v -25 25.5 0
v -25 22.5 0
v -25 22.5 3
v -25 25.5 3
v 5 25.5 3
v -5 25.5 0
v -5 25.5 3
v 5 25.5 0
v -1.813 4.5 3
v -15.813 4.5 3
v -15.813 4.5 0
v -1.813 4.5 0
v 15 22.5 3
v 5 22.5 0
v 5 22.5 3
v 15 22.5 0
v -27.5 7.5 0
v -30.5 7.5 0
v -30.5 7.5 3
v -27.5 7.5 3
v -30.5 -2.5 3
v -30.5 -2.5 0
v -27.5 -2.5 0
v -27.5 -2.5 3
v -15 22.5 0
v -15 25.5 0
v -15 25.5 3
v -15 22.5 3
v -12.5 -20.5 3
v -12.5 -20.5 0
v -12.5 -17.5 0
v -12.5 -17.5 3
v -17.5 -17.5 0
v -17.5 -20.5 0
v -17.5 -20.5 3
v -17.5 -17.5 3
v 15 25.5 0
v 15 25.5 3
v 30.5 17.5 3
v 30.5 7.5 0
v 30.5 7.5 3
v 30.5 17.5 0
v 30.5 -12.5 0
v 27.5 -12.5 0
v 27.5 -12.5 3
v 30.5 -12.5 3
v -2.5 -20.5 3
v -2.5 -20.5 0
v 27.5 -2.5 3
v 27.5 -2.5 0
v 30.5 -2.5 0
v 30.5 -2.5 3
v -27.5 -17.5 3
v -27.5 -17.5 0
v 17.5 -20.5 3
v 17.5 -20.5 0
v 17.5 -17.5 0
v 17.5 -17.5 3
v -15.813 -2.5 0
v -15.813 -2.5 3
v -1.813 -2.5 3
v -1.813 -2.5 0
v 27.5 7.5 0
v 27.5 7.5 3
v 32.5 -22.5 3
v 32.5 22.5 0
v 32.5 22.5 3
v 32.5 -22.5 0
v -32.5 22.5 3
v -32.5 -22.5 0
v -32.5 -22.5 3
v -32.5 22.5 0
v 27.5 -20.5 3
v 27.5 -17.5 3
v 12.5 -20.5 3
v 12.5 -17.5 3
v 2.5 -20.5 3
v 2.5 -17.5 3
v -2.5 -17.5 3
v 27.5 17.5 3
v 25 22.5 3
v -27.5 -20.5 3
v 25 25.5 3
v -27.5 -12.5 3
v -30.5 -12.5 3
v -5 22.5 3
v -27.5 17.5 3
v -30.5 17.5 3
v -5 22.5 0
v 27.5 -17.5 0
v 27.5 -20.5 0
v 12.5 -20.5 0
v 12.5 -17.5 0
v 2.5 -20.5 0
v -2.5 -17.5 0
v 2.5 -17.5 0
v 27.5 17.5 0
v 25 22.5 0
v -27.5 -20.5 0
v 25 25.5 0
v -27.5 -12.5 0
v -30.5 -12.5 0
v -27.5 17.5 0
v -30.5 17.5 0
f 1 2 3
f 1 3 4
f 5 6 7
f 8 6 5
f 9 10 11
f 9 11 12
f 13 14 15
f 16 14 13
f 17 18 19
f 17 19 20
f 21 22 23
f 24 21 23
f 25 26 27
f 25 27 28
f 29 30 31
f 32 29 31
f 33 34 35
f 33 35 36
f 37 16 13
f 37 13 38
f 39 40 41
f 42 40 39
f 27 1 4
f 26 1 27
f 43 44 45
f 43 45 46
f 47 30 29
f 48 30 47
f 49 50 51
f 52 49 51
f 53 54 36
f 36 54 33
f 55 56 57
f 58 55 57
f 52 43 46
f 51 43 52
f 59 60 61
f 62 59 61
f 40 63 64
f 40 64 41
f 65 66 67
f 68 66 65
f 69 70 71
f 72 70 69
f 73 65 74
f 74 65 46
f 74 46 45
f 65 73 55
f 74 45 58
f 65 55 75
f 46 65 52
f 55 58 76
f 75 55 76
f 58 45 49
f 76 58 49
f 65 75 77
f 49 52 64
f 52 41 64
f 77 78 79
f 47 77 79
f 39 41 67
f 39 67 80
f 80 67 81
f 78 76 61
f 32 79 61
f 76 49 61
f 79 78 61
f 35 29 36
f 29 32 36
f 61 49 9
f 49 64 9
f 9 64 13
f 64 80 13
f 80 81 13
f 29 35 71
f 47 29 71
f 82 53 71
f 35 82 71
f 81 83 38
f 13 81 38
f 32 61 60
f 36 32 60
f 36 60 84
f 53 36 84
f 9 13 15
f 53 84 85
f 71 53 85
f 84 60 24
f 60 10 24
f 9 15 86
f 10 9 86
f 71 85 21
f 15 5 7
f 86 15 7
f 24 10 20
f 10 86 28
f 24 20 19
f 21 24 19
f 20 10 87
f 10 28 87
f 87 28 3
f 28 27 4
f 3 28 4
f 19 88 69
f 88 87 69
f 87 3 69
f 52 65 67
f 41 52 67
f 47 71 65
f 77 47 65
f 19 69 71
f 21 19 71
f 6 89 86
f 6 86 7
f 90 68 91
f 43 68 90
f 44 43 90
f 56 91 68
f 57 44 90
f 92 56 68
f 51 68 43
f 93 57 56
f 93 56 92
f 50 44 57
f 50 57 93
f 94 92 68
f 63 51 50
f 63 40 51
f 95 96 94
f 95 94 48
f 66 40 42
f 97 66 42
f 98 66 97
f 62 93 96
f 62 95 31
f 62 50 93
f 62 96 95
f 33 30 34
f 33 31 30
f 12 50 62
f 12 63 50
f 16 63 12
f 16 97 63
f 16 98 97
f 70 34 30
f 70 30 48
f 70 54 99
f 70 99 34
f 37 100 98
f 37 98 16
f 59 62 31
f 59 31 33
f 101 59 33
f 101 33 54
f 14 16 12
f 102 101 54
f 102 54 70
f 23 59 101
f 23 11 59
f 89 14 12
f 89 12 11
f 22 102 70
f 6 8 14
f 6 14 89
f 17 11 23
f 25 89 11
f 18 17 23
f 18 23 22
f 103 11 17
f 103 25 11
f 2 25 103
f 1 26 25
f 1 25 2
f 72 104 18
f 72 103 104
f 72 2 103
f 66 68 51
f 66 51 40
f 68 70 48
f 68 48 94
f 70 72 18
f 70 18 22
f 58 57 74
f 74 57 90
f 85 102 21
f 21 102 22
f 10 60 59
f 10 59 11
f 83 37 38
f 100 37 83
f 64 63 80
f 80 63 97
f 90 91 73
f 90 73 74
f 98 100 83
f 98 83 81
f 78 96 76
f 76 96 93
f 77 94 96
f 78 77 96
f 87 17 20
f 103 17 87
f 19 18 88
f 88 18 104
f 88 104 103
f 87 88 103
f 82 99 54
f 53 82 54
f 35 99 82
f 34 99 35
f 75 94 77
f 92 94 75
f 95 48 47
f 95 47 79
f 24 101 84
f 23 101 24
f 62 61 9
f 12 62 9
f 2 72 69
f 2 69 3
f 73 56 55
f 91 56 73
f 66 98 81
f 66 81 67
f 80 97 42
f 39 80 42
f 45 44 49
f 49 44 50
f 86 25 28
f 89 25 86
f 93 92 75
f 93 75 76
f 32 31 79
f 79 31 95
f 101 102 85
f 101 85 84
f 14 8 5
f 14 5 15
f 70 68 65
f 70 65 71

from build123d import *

# Parameters (mm, degrees)
SKETCH_1_W          = 10
SKETCH_1_H          = 3
SKETCH_1_W_2        = 3
SKETCH_1_H_2        = 10
EXTRUDE_1_DEPTH     = 3
SKETCH_2_W          = 14
SKETCH_2_H          = 7
CUT_EXTRUDE_1_DEPTH = 10


with BuildPart() as part:
    # 草图1 → 凸台-拉伸1 (new body)
    with BuildSketch(Plane.XY):
        Polygon((-5, 22.5), (-5, 25.5), (5, 25.5), (5, 22.5), (15, 22.5), (15, 25.5), (25, 25.5), (25, 22.5), (32.5, 22.5), (32.5, -22.5), (-32.5, -22.5), (-32.5, 22.5), (-25, 22.5), (-25, 25.5), (-15, 25.5), (-15, 22.5), align=None)
        with Locations((-7.5, -19)):
            Rectangle(SKETCH_1_W, SKETCH_1_H, mode=Mode.SUBTRACT)
        with Locations((-22.5, -19)):
            Rectangle(SKETCH_1_W, SKETCH_1_H, mode=Mode.SUBTRACT)
        with Locations((7.5, -19)):
            Rectangle(SKETCH_1_W, SKETCH_1_H, mode=Mode.SUBTRACT)
        with Locations((22.5, -19)):
            Rectangle(SKETCH_1_W, SKETCH_1_H, mode=Mode.SUBTRACT)
        with Locations((-29, -7.5)):
            Rectangle(SKETCH_1_W_2, SKETCH_1_H_2, mode=Mode.SUBTRACT)
        with Locations((-29, 12.5)):
            Rectangle(SKETCH_1_W_2, SKETCH_1_H_2, mode=Mode.SUBTRACT)
        with Locations((29, -7.5)):
            Rectangle(SKETCH_1_W_2, SKETCH_1_H_2, mode=Mode.SUBTRACT)
        with Locations((29, 12.5)):
            Rectangle(SKETCH_1_W_2, SKETCH_1_H_2, mode=Mode.SUBTRACT)
    extrude(amount=EXTRUDE_1_DEPTH)

    # 草图2 → 切除-拉伸1 (cut)
    with BuildSketch(Plane.XY.offset(3)):
        with Locations((-8.812746432, 1)):
            Rectangle(SKETCH_2_W, SKETCH_2_H)
    extrude(amount=-CUT_EXTRUDE_1_DEPTH, mode=Mode.SUBTRACT)


solid = part.part
